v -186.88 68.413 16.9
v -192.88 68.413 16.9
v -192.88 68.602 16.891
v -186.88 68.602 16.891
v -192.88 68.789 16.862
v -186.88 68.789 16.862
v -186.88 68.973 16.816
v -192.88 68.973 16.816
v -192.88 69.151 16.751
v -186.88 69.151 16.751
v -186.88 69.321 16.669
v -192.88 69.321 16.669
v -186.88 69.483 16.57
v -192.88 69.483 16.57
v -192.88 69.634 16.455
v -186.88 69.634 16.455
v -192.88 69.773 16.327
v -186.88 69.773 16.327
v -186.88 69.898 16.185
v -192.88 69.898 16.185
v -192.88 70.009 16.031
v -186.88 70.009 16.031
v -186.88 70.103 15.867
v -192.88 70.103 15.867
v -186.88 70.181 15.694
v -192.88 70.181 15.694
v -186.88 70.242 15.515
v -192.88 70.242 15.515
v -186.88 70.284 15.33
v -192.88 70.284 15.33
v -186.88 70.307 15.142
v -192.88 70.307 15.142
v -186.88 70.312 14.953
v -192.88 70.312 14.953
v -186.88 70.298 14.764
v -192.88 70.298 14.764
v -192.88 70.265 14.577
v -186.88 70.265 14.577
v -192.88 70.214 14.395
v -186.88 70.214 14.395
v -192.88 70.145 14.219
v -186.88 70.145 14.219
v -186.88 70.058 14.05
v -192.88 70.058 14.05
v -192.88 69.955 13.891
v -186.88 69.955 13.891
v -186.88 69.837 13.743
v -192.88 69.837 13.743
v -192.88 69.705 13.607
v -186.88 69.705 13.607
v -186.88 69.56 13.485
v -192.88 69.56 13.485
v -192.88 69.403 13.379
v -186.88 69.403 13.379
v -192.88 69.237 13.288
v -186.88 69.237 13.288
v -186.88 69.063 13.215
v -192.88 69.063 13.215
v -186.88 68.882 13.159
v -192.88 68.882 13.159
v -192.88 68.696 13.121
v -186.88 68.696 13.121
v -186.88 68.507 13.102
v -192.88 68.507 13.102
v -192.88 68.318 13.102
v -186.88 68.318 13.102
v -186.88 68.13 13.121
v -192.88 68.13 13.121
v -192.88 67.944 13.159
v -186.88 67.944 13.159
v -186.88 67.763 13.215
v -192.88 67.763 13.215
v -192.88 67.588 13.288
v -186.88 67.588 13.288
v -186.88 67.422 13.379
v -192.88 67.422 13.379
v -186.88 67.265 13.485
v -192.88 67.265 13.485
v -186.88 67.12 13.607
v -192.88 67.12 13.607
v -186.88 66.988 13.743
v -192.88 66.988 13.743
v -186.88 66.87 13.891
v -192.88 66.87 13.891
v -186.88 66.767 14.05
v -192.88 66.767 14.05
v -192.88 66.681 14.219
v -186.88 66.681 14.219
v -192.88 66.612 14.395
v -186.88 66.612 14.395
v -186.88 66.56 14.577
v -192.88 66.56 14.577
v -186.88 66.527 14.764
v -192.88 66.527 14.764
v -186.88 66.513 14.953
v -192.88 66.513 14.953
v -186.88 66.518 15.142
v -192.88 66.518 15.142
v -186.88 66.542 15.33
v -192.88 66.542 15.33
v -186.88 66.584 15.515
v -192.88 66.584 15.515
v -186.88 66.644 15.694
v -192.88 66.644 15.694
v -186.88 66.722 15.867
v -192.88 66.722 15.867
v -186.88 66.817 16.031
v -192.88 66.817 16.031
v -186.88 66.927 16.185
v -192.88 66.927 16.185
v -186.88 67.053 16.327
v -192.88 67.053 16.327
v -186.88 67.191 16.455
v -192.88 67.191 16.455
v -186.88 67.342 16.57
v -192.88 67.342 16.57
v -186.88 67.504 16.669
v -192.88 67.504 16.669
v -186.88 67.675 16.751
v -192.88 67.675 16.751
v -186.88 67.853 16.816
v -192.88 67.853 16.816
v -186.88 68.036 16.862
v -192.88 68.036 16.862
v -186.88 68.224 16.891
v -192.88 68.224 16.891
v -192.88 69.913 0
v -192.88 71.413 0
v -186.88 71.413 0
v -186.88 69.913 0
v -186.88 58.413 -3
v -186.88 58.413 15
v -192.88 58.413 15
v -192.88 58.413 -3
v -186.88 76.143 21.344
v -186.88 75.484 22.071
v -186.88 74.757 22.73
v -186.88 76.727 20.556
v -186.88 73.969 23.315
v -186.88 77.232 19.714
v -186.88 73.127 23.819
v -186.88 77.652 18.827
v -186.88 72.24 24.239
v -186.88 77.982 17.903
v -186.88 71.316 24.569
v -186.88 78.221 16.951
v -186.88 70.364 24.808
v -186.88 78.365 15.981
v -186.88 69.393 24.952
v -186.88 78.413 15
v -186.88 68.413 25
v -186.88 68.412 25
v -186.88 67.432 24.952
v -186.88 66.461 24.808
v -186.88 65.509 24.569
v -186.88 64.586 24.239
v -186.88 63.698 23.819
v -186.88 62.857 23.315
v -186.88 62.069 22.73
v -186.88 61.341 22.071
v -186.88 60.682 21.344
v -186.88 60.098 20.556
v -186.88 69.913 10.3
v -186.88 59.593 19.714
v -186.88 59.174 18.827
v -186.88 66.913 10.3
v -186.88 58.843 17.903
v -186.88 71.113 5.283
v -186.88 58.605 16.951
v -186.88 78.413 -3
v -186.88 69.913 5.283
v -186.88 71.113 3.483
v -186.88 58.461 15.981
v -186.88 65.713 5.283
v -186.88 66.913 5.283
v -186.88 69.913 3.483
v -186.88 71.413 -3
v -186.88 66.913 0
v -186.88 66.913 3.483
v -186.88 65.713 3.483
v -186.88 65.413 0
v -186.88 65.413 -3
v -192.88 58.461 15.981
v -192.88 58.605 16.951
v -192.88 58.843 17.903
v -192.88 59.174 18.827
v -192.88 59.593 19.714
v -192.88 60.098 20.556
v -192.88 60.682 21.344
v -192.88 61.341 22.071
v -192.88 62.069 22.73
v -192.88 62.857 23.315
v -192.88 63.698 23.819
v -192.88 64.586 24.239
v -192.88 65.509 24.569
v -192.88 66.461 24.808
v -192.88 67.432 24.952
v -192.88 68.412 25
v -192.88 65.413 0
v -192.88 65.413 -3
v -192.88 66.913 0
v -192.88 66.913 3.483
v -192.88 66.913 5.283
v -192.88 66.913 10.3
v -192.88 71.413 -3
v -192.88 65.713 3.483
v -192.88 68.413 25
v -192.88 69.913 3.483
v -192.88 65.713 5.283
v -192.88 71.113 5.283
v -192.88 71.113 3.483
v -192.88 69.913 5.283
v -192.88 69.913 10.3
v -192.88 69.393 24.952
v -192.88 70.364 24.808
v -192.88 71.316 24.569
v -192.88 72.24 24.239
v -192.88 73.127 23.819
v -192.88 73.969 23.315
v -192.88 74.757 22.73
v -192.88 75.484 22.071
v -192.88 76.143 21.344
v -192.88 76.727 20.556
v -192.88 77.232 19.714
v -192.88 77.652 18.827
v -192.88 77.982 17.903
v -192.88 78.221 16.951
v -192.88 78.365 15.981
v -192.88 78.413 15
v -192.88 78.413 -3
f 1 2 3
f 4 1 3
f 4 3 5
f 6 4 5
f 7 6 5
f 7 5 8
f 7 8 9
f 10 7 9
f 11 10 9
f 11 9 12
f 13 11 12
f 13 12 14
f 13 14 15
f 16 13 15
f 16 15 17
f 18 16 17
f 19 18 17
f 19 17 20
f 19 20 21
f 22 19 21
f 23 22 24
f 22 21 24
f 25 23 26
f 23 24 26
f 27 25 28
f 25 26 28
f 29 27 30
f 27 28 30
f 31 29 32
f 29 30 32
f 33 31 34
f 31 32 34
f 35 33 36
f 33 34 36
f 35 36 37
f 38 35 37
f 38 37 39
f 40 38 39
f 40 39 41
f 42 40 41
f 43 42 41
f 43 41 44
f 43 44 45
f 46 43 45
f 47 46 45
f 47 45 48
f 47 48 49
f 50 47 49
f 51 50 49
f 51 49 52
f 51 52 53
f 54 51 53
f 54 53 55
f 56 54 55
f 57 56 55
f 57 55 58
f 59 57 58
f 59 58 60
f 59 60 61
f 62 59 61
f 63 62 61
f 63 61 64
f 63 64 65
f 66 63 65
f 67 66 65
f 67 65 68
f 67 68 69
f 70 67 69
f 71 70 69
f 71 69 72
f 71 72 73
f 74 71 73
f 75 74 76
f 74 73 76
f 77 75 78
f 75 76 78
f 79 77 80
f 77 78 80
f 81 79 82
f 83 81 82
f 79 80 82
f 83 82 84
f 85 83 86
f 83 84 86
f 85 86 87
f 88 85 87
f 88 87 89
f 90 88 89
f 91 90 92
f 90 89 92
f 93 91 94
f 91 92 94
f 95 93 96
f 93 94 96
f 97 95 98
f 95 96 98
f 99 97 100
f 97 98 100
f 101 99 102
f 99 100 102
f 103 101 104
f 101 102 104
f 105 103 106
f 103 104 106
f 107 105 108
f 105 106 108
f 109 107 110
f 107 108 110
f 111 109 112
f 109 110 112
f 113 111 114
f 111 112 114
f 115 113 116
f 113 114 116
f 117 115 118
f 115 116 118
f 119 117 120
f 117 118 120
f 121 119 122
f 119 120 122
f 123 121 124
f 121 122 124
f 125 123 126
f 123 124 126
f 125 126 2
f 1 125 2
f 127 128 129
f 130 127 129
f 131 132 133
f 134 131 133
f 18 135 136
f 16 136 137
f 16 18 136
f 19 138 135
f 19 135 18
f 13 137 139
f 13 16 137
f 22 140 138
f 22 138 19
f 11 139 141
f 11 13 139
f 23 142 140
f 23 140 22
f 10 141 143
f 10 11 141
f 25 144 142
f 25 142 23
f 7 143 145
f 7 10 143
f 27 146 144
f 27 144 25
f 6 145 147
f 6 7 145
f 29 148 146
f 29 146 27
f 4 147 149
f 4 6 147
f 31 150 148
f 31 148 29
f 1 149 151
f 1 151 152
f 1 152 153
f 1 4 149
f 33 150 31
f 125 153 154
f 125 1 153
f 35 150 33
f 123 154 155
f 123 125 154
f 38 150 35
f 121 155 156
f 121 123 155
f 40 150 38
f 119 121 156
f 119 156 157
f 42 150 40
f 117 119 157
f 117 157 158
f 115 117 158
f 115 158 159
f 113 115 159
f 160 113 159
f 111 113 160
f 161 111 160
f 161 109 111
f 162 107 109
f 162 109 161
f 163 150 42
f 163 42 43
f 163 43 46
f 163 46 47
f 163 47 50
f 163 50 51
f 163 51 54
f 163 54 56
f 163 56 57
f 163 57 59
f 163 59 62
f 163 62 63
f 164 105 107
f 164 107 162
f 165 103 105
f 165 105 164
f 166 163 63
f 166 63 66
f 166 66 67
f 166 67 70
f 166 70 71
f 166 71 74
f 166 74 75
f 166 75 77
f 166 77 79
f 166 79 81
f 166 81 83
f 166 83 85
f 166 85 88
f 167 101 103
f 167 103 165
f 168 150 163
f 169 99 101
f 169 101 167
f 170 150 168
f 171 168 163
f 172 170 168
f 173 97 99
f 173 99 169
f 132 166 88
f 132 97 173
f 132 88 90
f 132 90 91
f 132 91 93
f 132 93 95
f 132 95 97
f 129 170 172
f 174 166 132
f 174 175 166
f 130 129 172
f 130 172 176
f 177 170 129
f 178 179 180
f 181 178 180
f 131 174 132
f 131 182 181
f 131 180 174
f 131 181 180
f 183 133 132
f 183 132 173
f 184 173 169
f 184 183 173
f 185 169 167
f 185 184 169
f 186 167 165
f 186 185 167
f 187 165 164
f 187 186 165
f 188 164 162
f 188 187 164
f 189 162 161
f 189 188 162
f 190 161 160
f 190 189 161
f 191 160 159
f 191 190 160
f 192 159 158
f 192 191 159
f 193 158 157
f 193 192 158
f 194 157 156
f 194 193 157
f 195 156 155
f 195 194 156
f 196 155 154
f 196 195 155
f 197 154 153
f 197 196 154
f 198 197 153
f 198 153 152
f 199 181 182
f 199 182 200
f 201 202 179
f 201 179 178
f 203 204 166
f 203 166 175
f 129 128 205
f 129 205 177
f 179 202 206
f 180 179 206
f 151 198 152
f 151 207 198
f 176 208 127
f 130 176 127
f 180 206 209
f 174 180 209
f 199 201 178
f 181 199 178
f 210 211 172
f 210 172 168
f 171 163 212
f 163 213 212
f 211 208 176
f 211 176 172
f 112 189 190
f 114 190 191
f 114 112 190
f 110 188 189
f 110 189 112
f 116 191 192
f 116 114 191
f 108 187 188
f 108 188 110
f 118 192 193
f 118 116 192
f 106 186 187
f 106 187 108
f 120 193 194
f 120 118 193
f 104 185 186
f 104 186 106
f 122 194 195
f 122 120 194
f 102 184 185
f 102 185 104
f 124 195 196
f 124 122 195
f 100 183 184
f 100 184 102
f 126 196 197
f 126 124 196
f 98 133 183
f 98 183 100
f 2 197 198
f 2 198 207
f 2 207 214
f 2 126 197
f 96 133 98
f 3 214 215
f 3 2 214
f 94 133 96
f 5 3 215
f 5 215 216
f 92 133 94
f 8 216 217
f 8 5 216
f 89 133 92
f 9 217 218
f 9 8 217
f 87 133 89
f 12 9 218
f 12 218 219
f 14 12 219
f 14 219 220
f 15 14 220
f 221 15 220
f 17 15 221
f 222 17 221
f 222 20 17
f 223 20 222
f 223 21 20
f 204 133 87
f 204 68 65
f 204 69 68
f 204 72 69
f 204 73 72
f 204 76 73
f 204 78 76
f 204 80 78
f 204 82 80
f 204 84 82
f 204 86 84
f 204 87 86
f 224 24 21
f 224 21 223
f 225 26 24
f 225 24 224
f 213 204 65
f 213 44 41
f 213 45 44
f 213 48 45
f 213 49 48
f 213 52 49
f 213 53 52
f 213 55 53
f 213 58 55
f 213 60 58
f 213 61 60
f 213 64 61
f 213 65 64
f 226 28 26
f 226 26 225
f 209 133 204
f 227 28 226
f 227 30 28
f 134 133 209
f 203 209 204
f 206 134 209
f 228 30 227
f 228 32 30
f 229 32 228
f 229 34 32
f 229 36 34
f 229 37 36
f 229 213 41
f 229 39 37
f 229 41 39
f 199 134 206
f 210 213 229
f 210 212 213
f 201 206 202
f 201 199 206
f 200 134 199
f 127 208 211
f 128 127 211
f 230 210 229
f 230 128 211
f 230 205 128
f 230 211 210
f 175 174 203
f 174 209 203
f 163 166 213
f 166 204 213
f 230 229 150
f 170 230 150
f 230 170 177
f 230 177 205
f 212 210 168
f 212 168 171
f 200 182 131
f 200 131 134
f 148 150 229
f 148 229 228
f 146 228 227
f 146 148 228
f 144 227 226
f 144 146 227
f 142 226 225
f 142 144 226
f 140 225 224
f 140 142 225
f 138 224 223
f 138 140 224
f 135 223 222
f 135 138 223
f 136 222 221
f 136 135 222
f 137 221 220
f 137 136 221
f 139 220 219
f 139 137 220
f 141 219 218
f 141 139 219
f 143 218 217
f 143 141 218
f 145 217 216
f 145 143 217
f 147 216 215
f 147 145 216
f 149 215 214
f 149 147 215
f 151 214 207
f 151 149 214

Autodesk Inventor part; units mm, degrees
ref_plane "YZ Plane" through (0, 0, 0) normal (1, 0, 0) x (0, 1, 0)
ref_plane "XZ Plane" through (0, 0, 0) normal (0, 1, 0) x (-1, 0, 0)
ref_plane "XY Plane" through (0, 0, 0) normal (0, 0, 1) x (1, 0, 0)
sketch "Эскиз1" plane through (0, 0, 0) normal (0, 0, 1) x (1, 0, 0)
  line L0 (-186.8805, 58.4127) -> (-192.8805, 58.4127)
  line L1 (-192.8805, 58.4127) -> (-192.8805, 78.4127)
  line L2 (-192.8805, 78.4127) -> (-186.8805, 78.4127)
  line L3 (-186.8805, 78.4127) -> (-186.8805, 58.4127)
  line L4 (-192.8805, 65.9127) -> (-192.8805, 70.9127) projected
  point P0 (0, 0)
  point P1 (-192.8805, 68.4127)
  dimension "d0" = 20
  dimension "d1" = 6
  dimension "d19" = 0
extrude "Выдавливание1" add sketch "Эскиз1" along normal blind 25
fillet "Сопряжение1" radius 10 2 edges at (-189.8805, 58.4127, 25) (-189.8805, 78.4127, 25)
sketch "Эскиз2" plane through (-192.8805, 58.4127, 0) normal (-1, 0, 0) x (0, 0, 1)
  circle A0 centre (15, 10) radius 1.9
  line L0 (0, 20) -> (0, 0) projected
  line L1 (0, 10) -> (25, 10) construction
  arc A1 (15, 0) -> (15, 20) centre (15, 10) ccw projected
  point P0 (0, -58.4127)
  dimension "d5" = 3.8
extrude "Выдавливание2" cut sketch "Эскиз2" against normal up to surface (6 mm away)
sketch "Эскиз3" plane through (0, 0, 0) normal (0, 0, -1) x (-1, 0, 0)
  line L0 (192.8805, 58.4127) -> (186.8805, 58.4127)
  line L1 (186.8805, 58.4127) -> (186.8805, 65.4127)
  line L2 (186.8805, 65.4127) -> (192.8805, 65.4127)
  line L3 (192.8805, 65.4127) -> (192.8805, 58.4127)
  line L4 (186.8805, 78.4127) -> (192.8805, 78.4127) projected
  line L5 (186.8805, 78.4127) -> (192.8805, 78.4127)
  line L6 (192.8805, 78.4127) -> (192.8805, 71.4127)
  line L7 (192.8805, 71.4127) -> (186.8805, 71.4127)
  line L8 (186.8805, 71.4127) -> (186.8805, 78.4127)
  point P0 (0, 0)
  dimension "d8" = 7
  dimension "d9" = 7
  dimension "d18" = 6
extrude "Выдавливание3" add sketch "Эскиз3" along normal blind 2
sketch "Эскиз4" plane through (-192.8805, 68.4127, 15) normal (-1, 0, 0) x (0, 0, 1)
  line L0 (-15, 3) -> (-15, -3) projected
  line L1 (-15, 0) -> (-4.7, 0)
  line L2 (-4.7, 0) -> (-4.7, -1.5)
  line L3 (-15, -1.5) -> (-15, 0)
  line L4 (-4.7, 0) -> (-4.7, 1.5)
  line L5 (-10.2565, 0) -> (-12.2169, 0)
  line L6 (-11.5169, -1.5) -> (-11.5169, -2.7)
  line L7 (-11.5169, -2.7) -> (-9.7169, -2.7)
  line L8 (-9.7169, -2.7) -> (-9.7169, -1.5)
  line L9 (-11.5169, 1.5) -> (-11.5169, 2.7)
  line L10 (-11.5169, 2.7) -> (-9.7169, 2.7)
  line L11 (-9.7169, 2.7) -> (-9.7169, 1.5)
  line L12 (-4.7, -1.5) -> (-9.7169, -1.5)
  line L13 (-11.5169, -1.5) -> (-15, -1.5)
  line L14 (-4.7, 1.5) -> (-9.7169, 1.5)
  line L15 (-11.5169, 1.5) -> (-15, 1.5)
  line L16 (-4.7, 1.5) -> (-9.7169, 1.5)
  line L17 (-11.5169, 1.5) -> (-15, 1.5)
  point P0 (-15, -68.4127)
  dimension "d12" = 10.3
  dimension "d13" = 1.5
  dimension "d16" = 1.8
  dimension "d17" = 5.4
extrude "Выдавливание4" cut sketch "Эскиз4" against normal up to surface (6 mm away)
sketch "Эскиз5" plane through (0, 0, -2) normal (0, 0, -1) x (-1, 0, 0)
  point P0 (0, 0)
sketch "Эскиз6" plane through (0, 0, -2) normal (0, 0, -1) x (-1, 0, 0)
  line L0 (186.8805, 71.4127) -> (192.8805, 71.4127)
  line L1 (192.8805, 71.4127) -> (192.8805, 78.4127)
  line L2 (192.8805, 78.4127) -> (186.8805, 78.4127)
  line L3 (186.8805, 78.4127) -> (186.8805, 71.4127)
  line L4 (192.8805, 65.4127) -> (186.8805, 65.4127)
  line L5 (186.8805, 65.4127) -> (186.8805, 58.4127)
  line L6 (186.8805, 58.4127) -> (192.8805, 58.4127)
  line L7 (192.8805, 58.4127) -> (192.8805, 65.4127)
  point P0 (0, 0)
sketch "Эскиз7" plane through (0, 0, -2) normal (0, 0, -1) x (-1, 0, 0)
  point P0 (0, 0)
extrude "Выдавливание5" add sketch "Эскиз6" along normal blind 1
properties part number "Крепление рычага к лицу"
